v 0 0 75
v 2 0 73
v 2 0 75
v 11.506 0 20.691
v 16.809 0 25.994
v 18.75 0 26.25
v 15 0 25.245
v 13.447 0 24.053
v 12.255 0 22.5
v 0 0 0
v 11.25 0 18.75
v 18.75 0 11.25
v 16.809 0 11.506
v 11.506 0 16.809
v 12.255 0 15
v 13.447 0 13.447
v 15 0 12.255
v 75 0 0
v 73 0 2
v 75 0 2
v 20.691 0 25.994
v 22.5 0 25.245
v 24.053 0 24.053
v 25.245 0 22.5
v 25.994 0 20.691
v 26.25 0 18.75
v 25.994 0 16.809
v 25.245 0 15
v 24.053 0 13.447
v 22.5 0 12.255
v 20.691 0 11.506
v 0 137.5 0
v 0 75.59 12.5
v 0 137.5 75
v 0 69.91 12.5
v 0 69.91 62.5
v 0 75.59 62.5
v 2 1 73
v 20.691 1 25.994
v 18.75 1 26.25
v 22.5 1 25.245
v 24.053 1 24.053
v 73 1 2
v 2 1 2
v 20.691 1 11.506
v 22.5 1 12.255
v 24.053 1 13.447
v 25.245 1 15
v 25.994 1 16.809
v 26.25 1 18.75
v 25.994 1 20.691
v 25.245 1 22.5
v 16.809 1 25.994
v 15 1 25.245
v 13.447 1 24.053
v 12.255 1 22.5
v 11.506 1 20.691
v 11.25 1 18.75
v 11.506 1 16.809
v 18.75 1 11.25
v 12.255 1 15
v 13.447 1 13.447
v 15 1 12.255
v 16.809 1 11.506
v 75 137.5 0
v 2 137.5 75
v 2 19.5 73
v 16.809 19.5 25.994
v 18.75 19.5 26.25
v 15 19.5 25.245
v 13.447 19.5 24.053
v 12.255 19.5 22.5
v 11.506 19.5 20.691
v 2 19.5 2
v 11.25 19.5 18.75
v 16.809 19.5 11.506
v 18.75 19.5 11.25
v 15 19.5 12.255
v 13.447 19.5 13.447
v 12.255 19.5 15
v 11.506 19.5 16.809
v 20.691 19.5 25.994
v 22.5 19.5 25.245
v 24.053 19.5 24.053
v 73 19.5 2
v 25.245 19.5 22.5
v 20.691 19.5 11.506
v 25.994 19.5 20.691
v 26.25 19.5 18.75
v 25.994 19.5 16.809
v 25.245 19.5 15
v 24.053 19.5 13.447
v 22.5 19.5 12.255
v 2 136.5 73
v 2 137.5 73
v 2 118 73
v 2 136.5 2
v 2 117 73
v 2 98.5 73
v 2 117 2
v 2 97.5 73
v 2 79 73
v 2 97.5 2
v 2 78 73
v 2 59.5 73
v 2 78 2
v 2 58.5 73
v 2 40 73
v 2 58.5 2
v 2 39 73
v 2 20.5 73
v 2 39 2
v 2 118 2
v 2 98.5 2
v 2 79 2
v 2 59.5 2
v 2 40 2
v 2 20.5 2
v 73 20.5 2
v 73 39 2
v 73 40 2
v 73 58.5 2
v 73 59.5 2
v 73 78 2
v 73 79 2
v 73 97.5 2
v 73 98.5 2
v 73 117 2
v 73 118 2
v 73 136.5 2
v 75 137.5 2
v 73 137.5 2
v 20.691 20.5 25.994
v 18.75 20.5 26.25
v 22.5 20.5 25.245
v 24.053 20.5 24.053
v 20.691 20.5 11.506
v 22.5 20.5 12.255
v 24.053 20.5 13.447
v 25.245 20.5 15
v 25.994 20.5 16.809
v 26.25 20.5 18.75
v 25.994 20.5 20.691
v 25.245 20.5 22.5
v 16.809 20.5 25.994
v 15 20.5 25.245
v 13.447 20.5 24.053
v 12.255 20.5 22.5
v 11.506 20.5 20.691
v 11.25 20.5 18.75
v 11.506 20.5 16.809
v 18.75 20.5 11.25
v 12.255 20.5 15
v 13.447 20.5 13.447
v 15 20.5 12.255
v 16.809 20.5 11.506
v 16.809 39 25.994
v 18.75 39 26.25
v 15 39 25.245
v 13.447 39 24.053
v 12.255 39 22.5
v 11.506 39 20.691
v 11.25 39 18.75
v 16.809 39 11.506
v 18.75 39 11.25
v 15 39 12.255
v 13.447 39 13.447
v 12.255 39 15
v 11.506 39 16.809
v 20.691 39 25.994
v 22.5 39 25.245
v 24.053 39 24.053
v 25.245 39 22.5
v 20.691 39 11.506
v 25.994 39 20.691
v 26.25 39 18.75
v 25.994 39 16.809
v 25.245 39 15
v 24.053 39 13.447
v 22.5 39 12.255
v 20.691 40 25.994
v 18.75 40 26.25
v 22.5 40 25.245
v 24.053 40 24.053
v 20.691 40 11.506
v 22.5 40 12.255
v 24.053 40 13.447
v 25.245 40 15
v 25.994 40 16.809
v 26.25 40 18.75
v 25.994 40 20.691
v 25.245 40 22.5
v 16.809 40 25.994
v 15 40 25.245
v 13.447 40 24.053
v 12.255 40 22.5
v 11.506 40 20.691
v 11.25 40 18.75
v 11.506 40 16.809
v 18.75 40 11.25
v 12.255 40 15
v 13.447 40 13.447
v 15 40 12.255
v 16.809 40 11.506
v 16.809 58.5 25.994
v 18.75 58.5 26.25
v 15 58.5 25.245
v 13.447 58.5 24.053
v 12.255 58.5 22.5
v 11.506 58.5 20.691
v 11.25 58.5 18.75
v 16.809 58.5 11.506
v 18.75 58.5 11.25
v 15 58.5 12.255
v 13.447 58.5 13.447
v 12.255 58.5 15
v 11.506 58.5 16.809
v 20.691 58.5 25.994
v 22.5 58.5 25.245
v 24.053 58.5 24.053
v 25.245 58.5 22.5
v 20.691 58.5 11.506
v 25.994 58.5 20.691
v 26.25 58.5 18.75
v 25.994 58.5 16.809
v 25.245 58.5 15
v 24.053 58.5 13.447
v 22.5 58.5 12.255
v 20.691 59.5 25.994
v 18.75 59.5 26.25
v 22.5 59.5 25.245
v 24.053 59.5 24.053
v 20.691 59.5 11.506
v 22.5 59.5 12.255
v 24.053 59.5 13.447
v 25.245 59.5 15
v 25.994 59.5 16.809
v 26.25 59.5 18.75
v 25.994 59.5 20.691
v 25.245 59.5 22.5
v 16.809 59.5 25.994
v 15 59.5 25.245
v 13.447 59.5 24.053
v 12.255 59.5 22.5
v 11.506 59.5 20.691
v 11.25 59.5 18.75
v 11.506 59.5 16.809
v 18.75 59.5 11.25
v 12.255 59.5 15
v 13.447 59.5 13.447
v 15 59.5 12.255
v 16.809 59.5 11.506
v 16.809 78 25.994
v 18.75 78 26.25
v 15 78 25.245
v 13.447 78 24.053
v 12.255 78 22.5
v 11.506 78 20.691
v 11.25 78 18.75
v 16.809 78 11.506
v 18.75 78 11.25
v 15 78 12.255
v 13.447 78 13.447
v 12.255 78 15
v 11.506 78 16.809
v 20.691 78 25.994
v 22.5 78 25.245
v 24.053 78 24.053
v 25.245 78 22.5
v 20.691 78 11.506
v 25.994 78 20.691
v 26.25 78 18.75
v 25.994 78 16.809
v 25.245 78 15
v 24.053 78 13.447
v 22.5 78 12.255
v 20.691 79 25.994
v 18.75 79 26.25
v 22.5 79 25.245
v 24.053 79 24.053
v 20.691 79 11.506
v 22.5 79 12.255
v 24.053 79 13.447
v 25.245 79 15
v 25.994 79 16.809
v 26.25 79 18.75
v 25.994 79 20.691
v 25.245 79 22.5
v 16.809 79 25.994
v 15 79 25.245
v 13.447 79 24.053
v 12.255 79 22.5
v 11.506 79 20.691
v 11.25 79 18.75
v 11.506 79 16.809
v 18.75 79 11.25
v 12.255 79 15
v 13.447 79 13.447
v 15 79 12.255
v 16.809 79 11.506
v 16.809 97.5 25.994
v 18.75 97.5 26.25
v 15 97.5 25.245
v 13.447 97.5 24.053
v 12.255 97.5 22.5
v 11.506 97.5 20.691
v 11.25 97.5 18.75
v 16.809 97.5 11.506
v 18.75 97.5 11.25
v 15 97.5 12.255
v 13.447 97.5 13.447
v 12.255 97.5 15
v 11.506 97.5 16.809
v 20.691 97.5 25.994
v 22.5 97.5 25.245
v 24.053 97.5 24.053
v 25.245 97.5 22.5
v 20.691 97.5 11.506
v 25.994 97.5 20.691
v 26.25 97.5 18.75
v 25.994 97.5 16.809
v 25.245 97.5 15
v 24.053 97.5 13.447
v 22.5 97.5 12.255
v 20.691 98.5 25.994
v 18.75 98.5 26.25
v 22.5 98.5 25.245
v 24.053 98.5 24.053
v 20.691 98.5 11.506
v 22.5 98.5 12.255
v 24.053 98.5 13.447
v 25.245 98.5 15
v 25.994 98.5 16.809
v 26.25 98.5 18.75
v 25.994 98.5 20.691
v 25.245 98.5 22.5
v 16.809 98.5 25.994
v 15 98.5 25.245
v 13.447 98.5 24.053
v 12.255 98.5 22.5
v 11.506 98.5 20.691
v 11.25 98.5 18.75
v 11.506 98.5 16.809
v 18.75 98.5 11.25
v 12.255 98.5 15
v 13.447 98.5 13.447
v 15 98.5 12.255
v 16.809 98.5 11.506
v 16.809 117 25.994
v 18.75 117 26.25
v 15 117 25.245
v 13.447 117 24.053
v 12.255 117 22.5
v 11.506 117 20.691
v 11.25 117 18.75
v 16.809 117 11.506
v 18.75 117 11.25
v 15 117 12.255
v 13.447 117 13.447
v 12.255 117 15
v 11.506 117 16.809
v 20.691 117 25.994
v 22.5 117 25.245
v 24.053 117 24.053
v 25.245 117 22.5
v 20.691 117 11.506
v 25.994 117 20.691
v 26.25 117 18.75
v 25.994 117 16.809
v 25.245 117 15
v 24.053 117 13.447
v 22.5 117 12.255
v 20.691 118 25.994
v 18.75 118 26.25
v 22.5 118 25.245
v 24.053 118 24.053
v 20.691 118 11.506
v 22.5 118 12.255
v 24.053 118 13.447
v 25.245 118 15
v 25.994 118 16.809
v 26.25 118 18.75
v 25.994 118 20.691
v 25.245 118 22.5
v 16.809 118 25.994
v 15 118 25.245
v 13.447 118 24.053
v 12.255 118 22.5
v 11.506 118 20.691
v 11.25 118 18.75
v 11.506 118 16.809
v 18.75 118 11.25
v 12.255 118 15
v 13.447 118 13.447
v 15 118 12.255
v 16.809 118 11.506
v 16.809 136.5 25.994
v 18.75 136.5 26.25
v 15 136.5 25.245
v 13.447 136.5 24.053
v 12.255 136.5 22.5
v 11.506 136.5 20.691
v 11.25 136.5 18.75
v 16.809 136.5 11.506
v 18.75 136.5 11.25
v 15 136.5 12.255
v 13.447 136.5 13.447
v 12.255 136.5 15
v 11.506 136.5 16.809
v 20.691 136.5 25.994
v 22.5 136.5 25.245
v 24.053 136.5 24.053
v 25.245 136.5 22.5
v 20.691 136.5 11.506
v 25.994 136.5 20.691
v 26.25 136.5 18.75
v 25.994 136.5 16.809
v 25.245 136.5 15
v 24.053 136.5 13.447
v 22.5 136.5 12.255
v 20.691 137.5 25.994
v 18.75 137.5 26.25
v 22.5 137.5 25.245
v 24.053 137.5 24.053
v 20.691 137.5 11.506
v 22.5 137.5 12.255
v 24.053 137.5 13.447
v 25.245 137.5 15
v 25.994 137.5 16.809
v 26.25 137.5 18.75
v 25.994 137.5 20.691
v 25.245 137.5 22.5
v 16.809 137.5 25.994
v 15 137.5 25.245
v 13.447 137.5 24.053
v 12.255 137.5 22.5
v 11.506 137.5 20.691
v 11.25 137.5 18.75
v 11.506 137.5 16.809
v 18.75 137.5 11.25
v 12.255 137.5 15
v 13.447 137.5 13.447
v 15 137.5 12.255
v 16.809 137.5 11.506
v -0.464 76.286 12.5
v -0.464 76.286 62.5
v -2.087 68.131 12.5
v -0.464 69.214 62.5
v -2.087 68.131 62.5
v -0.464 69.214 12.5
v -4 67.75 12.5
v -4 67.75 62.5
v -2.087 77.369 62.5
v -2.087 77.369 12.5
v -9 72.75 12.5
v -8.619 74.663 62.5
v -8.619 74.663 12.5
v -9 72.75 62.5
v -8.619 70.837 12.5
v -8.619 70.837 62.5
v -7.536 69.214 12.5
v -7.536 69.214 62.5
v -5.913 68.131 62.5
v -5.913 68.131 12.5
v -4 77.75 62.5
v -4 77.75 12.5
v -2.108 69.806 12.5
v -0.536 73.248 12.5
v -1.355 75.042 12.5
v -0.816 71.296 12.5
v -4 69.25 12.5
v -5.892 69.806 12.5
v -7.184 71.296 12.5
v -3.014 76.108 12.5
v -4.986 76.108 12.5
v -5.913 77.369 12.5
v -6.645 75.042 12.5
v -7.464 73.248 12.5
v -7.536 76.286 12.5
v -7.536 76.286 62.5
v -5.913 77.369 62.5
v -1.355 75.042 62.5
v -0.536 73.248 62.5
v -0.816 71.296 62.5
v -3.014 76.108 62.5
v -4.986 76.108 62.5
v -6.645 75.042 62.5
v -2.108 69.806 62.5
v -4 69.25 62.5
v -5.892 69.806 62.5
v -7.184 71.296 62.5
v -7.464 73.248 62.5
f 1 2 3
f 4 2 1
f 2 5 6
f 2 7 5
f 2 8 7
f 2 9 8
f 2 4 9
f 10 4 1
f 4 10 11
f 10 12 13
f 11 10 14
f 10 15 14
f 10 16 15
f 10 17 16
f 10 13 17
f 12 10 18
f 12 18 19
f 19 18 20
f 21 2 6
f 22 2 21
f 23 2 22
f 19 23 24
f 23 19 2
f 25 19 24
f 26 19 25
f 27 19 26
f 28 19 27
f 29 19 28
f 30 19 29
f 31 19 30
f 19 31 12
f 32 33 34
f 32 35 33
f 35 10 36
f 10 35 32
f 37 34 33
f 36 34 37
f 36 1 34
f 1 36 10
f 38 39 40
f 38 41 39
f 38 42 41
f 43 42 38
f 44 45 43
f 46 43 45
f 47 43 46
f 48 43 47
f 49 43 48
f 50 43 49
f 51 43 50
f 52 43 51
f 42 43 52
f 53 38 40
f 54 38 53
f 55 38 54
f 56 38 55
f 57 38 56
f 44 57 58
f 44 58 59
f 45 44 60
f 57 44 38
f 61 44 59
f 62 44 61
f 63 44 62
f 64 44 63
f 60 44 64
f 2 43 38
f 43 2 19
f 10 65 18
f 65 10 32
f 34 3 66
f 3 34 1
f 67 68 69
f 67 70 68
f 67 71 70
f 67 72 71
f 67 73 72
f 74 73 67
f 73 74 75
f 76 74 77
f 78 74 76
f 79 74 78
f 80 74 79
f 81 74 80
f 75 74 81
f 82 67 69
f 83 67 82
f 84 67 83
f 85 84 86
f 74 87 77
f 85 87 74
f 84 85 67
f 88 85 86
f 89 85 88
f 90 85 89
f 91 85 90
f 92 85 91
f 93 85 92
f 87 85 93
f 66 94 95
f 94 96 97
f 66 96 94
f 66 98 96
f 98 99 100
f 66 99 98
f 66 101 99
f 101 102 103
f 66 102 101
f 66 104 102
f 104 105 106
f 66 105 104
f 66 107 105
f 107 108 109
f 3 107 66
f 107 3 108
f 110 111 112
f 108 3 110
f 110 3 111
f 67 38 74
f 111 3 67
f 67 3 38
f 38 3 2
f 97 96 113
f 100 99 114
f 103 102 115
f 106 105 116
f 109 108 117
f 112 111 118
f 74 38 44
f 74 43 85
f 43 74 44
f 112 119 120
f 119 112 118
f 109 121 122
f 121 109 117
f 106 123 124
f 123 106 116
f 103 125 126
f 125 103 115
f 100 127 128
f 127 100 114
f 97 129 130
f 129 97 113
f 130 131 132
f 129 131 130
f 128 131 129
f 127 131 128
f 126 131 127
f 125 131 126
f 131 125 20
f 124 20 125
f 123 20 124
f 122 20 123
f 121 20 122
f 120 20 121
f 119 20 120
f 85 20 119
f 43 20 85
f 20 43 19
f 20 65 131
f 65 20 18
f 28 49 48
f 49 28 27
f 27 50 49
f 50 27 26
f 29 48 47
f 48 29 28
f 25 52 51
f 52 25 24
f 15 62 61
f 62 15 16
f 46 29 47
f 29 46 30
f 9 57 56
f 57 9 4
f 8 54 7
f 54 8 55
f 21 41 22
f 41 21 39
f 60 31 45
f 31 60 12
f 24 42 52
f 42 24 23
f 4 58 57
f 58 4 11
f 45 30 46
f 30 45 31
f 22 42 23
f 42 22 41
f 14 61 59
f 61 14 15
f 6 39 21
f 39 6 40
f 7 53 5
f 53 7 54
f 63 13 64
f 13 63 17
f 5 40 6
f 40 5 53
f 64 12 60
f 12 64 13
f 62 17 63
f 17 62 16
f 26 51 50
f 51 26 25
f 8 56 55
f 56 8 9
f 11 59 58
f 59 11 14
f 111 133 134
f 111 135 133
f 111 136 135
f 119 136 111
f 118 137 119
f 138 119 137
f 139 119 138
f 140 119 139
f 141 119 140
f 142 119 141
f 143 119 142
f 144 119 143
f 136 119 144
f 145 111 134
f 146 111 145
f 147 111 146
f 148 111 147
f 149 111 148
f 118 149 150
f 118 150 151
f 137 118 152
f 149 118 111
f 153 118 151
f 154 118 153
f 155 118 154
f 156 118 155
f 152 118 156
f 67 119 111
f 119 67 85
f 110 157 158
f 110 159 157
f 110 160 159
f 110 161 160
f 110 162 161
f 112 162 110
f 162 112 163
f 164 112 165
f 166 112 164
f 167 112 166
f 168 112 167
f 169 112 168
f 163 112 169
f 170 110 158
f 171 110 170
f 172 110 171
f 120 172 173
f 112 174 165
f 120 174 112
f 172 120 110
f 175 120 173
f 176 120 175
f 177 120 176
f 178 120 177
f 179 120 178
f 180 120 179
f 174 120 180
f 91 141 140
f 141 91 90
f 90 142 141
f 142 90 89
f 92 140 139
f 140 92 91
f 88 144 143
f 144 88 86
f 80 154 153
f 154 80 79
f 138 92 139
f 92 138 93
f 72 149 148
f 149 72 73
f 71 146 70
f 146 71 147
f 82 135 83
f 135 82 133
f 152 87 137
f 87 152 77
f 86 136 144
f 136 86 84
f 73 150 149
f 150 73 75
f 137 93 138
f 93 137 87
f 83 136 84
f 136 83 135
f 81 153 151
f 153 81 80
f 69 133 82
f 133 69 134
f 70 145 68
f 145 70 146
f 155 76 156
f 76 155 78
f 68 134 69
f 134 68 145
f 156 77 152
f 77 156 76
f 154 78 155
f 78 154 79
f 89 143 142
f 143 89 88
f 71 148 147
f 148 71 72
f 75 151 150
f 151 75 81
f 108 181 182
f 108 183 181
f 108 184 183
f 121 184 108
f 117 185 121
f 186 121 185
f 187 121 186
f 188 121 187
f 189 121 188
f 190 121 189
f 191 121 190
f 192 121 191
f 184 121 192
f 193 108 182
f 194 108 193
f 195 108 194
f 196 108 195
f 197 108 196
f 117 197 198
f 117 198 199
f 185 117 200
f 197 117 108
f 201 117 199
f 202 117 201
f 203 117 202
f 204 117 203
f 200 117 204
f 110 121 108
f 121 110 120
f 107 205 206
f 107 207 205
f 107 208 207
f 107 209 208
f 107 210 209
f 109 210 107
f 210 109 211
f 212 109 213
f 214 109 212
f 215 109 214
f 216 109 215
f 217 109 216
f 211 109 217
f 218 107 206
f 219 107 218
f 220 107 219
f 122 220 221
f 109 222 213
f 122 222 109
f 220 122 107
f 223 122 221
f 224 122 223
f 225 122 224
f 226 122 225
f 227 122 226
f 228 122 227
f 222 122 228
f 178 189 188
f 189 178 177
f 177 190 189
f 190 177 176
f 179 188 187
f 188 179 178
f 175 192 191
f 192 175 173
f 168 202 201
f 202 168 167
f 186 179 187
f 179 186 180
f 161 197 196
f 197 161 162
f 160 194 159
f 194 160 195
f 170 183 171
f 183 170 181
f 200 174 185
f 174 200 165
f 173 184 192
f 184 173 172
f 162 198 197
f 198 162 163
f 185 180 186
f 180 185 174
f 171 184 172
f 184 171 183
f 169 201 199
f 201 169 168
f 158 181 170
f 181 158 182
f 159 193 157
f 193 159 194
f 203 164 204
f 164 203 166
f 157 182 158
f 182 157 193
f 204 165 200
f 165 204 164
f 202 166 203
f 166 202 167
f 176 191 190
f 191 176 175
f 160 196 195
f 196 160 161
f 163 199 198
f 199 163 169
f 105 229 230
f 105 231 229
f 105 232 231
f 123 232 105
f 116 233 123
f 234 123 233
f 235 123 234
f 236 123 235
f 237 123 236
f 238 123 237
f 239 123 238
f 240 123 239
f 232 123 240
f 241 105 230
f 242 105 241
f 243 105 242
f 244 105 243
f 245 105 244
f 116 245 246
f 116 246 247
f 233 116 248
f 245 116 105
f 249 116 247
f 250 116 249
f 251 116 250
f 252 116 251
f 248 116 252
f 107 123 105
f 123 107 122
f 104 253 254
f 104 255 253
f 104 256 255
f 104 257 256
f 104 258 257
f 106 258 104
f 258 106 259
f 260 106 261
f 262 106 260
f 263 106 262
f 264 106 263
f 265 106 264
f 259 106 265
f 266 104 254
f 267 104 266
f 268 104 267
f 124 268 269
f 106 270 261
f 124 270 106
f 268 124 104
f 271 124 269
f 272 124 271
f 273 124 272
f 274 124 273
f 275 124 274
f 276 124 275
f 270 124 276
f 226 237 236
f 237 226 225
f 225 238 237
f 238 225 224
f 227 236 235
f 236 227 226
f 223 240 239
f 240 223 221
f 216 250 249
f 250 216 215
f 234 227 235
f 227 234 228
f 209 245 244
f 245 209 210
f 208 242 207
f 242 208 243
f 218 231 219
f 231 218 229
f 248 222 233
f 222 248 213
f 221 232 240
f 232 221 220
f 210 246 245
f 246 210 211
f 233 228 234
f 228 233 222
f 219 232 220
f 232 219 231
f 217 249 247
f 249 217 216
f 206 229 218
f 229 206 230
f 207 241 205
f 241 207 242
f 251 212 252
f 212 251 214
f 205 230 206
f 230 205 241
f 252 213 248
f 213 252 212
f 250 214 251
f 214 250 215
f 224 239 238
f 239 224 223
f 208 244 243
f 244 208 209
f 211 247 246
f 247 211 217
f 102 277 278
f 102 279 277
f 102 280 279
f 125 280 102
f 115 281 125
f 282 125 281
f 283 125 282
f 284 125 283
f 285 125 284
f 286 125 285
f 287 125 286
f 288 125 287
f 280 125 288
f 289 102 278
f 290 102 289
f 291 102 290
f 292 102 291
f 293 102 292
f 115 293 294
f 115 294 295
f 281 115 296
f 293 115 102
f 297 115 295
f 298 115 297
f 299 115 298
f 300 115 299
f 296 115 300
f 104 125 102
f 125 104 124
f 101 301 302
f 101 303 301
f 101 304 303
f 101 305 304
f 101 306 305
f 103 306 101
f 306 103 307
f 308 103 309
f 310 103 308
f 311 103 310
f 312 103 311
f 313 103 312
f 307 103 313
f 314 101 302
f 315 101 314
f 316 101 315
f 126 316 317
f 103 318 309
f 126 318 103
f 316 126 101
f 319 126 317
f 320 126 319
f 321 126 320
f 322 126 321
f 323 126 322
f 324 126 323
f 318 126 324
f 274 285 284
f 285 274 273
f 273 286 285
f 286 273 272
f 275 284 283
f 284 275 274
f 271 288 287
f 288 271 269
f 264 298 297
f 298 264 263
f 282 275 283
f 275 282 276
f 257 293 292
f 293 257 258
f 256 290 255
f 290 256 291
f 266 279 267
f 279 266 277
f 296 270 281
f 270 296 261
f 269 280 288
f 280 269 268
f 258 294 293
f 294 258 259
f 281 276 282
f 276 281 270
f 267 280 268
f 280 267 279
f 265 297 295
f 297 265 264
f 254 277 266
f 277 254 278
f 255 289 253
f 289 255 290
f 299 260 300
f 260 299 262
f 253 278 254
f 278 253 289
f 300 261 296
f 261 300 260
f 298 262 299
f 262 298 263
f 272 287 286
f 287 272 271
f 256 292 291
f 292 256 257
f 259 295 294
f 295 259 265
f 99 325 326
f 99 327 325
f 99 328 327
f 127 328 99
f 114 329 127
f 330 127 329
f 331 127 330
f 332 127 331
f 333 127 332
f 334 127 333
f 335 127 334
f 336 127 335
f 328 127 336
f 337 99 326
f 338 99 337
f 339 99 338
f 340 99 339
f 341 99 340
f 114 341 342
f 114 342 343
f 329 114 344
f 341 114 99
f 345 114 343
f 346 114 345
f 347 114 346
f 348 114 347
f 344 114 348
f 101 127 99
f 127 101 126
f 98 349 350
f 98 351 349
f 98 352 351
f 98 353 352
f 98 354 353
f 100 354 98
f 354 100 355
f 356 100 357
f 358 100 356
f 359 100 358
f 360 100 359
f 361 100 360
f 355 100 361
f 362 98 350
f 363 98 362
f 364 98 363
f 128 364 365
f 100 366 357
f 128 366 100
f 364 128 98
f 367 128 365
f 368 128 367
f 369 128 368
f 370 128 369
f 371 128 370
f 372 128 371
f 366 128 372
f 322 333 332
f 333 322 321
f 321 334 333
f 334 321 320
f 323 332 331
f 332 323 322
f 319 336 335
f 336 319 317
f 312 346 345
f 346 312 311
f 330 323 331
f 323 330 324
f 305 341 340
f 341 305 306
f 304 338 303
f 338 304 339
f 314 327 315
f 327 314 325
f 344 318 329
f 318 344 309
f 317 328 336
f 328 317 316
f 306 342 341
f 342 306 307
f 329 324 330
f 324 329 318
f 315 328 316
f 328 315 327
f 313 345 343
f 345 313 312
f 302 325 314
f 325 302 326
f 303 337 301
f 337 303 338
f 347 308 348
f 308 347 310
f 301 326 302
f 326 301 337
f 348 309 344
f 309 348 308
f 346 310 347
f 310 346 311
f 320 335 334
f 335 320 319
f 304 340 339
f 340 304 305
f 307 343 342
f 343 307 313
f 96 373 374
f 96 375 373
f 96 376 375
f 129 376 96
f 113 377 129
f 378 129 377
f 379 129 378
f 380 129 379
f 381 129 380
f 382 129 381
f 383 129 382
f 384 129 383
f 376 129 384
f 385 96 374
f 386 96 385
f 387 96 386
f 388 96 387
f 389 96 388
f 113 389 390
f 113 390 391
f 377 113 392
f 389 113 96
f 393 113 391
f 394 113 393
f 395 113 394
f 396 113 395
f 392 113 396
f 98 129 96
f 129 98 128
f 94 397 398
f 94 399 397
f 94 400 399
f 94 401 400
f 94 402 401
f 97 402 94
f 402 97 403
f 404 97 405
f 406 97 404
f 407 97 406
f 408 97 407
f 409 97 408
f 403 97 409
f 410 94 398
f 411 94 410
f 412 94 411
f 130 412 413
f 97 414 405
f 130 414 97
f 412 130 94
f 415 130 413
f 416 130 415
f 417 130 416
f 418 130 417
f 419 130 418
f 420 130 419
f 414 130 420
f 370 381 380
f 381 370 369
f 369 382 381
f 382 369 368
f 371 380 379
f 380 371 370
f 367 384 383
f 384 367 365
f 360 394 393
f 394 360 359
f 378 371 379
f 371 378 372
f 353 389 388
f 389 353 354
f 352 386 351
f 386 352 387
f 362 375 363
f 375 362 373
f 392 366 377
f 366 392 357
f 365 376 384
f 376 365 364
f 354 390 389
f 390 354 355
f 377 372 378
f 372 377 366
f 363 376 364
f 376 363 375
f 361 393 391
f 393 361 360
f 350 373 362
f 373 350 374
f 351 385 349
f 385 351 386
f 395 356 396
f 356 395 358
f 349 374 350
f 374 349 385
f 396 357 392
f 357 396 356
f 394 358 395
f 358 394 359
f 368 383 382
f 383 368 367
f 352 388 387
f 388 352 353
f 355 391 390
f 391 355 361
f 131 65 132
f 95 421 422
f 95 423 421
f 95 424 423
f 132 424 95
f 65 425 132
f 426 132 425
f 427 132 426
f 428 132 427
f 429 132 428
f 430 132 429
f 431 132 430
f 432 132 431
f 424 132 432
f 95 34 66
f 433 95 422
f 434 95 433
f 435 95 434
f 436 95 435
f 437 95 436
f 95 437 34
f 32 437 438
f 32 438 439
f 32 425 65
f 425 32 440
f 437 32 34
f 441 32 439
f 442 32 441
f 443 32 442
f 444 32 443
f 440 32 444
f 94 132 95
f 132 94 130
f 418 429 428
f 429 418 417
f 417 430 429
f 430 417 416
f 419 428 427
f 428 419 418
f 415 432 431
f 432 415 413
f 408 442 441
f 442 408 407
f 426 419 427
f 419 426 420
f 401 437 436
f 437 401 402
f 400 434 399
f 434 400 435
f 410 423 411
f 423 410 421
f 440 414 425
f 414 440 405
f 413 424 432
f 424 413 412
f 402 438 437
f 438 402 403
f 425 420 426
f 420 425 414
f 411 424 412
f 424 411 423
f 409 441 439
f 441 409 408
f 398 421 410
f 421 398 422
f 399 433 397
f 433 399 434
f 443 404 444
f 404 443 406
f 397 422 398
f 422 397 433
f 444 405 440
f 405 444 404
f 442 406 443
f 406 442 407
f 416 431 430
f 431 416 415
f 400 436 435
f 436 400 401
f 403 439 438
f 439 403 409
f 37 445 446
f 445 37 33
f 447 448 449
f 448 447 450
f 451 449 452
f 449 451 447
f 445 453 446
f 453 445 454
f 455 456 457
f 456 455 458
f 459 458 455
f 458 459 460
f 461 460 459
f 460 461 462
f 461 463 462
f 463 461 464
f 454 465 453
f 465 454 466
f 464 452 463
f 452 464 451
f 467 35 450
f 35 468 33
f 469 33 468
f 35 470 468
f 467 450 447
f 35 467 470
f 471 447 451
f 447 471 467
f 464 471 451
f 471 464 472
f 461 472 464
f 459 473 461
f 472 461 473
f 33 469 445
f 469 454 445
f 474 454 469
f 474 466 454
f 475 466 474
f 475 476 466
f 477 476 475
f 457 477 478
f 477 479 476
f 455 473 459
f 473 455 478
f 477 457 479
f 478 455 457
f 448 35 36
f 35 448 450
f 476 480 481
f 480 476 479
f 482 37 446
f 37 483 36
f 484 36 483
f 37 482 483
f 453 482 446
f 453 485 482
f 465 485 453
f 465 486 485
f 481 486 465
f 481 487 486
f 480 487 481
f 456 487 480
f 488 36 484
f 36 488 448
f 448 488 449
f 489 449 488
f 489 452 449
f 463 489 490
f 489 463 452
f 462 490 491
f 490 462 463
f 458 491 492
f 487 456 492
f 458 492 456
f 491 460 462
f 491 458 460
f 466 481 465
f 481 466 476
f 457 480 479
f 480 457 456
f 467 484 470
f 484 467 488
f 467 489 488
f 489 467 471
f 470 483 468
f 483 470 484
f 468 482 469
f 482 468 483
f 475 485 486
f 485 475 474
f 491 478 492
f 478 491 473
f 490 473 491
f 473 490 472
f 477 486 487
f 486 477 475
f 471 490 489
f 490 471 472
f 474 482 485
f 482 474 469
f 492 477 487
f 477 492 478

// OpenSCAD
// Protective corner to transport picture / photo frames
// Requires 4 which can be coupled by a rope.
// Configurable for size, thinkness of the frames and number of frames to be transported.

// === CONFIG ===
// The number of frames that should be transported and need protection
frames = 7;                     
// The thickness of the individal frames
frame_thickness = 18.5;           
// The size of the protector along the X-axis
protective_edge_length = 75;
// The size of the protector along the Y-axis
protective_edge_depth = 75;
// The outside thickness of the protective edges
protective_edge_thickness = 2;
// The thickness of each layer's separation
bottom_thickness = 1;

// The thickness of the rope used to keep all edges together (and carry the set)
rope_thickness = 6;
// Indicate whether the rope carrier is also required on the Y-Axis [true, false]. No (= false) is easier for printing (supports) and preparing for transport
rope_carrier_Y_axis = false;    // [true,false]

/* [Hidden] */ // Everything below this is hidden from the customizer
frame=0;
//tolerance = 0.3;


// Driehoekige bodem
module triangle_base() {
    linear_extrude(height = bottom_thickness)
        polygon([
            [0, 0],                    // Hoekpunt
            [protective_edge_length, 0],          // X-as einde (ligger)
            [0, protective_edge_depth]           // Y-as einde (rechte zijde)
        ]);
}

// Wand langs X-as (ligger)
module wall_x() {
    translate([0, 0, (frame) * (frame_thickness + protective_edge_thickness)]) {
        cube([protective_edge_length, protective_edge_thickness, (frame_thickness + bottom_thickness)]);
    }
}

// Wand langs Y-as (verticale zijde)
module wall_y() {
    translate([0, 0, (frame) * (frame_thickness + protective_edge_thickness)])
        cube([protective_edge_thickness, protective_edge_depth, (frame_thickness + bottom_thickness)]);
}

module protectiveEdge() {
    difference() {
        union() {
            triangle_base();
            wall_x();
            wall_y();
        }
        
        // Optioneel handvat
        translate([protective_edge_length/4, protective_edge_depth/4, bottom_thickness-2])
            rotate([0,0,90])
                cylinder(d=15, h=protective_edge_thickness+2, center=true);
    }
}

// top-cover triangle
module topCoverTriangle () {
    translate([0,0,frames*(frame_thickness + bottom_thickness)]) {
        union() {
            difference() {
                triangle_base();
                translate([protective_edge_length/4, protective_edge_depth/4, 0])
                    rotate([0,0,90])
                        cylinder(d=15, h=protective_edge_thickness+2, center=true);
            }
            cube([protective_edge_length, protective_edge_thickness, bottom_thickness]);
            cube([protective_edge_thickness, protective_edge_depth, bottom_thickness]);

        }
    }
}

// Carrier Rope Module
module carrierRopeCylinder() {
        difference() {
            cylinder(h = protective_edge_length*2/3, d = rope_thickness + 2* protective_edge_thickness, center=true);
            cylinder(h = protective_edge_length*2/3, d = rope_thickness + 1, center=true);
        }
}

// Carrier Rope Module along X-axis
module carrierRopeCylinderX() {
    rotate([0, 90,0]) 
        carrierRopeCylinder();
}

// Carrier Rope Module along Y-axis
module carrierRopeCylinderY() {
    rotate([90, 0,0]) 
        carrierRopeCylinder();
}

// Carrier Rope Module (across both axis)
module fullRopeCarrier () {
    rope_height = (frames*(frame_thickness+protective_edge_thickness)+protective_edge_thickness)/2;
    // Rope Carrier Cylinder X-Axis
    translate([protective_edge_length / 2, -rope_thickness+protective_edge_thickness,rope_height])
        carrierRopeCylinderX();
        
    // Rope Carrier Cylinder Y-Axis
    if (rope_carrier_Y_axis) {
        translate([-rope_thickness+protective_edge_thickness,protective_edge_depth / 2, rope_height])
            carrierRopeCylinderY();
    }
}

// Protector
module protector() {
    for (frame = [0: frames-1]){
        translate([0,0,frame*(frame_thickness + bottom_thickness)])
            protectiveEdge();
    }
    topCoverTriangle ();
    fullRopeCarrier ();
}

// Rotate the protector to have one side on the print plate.
// Reduces the amount of supports required.
rotate([-90,-90,0])
    protector();
